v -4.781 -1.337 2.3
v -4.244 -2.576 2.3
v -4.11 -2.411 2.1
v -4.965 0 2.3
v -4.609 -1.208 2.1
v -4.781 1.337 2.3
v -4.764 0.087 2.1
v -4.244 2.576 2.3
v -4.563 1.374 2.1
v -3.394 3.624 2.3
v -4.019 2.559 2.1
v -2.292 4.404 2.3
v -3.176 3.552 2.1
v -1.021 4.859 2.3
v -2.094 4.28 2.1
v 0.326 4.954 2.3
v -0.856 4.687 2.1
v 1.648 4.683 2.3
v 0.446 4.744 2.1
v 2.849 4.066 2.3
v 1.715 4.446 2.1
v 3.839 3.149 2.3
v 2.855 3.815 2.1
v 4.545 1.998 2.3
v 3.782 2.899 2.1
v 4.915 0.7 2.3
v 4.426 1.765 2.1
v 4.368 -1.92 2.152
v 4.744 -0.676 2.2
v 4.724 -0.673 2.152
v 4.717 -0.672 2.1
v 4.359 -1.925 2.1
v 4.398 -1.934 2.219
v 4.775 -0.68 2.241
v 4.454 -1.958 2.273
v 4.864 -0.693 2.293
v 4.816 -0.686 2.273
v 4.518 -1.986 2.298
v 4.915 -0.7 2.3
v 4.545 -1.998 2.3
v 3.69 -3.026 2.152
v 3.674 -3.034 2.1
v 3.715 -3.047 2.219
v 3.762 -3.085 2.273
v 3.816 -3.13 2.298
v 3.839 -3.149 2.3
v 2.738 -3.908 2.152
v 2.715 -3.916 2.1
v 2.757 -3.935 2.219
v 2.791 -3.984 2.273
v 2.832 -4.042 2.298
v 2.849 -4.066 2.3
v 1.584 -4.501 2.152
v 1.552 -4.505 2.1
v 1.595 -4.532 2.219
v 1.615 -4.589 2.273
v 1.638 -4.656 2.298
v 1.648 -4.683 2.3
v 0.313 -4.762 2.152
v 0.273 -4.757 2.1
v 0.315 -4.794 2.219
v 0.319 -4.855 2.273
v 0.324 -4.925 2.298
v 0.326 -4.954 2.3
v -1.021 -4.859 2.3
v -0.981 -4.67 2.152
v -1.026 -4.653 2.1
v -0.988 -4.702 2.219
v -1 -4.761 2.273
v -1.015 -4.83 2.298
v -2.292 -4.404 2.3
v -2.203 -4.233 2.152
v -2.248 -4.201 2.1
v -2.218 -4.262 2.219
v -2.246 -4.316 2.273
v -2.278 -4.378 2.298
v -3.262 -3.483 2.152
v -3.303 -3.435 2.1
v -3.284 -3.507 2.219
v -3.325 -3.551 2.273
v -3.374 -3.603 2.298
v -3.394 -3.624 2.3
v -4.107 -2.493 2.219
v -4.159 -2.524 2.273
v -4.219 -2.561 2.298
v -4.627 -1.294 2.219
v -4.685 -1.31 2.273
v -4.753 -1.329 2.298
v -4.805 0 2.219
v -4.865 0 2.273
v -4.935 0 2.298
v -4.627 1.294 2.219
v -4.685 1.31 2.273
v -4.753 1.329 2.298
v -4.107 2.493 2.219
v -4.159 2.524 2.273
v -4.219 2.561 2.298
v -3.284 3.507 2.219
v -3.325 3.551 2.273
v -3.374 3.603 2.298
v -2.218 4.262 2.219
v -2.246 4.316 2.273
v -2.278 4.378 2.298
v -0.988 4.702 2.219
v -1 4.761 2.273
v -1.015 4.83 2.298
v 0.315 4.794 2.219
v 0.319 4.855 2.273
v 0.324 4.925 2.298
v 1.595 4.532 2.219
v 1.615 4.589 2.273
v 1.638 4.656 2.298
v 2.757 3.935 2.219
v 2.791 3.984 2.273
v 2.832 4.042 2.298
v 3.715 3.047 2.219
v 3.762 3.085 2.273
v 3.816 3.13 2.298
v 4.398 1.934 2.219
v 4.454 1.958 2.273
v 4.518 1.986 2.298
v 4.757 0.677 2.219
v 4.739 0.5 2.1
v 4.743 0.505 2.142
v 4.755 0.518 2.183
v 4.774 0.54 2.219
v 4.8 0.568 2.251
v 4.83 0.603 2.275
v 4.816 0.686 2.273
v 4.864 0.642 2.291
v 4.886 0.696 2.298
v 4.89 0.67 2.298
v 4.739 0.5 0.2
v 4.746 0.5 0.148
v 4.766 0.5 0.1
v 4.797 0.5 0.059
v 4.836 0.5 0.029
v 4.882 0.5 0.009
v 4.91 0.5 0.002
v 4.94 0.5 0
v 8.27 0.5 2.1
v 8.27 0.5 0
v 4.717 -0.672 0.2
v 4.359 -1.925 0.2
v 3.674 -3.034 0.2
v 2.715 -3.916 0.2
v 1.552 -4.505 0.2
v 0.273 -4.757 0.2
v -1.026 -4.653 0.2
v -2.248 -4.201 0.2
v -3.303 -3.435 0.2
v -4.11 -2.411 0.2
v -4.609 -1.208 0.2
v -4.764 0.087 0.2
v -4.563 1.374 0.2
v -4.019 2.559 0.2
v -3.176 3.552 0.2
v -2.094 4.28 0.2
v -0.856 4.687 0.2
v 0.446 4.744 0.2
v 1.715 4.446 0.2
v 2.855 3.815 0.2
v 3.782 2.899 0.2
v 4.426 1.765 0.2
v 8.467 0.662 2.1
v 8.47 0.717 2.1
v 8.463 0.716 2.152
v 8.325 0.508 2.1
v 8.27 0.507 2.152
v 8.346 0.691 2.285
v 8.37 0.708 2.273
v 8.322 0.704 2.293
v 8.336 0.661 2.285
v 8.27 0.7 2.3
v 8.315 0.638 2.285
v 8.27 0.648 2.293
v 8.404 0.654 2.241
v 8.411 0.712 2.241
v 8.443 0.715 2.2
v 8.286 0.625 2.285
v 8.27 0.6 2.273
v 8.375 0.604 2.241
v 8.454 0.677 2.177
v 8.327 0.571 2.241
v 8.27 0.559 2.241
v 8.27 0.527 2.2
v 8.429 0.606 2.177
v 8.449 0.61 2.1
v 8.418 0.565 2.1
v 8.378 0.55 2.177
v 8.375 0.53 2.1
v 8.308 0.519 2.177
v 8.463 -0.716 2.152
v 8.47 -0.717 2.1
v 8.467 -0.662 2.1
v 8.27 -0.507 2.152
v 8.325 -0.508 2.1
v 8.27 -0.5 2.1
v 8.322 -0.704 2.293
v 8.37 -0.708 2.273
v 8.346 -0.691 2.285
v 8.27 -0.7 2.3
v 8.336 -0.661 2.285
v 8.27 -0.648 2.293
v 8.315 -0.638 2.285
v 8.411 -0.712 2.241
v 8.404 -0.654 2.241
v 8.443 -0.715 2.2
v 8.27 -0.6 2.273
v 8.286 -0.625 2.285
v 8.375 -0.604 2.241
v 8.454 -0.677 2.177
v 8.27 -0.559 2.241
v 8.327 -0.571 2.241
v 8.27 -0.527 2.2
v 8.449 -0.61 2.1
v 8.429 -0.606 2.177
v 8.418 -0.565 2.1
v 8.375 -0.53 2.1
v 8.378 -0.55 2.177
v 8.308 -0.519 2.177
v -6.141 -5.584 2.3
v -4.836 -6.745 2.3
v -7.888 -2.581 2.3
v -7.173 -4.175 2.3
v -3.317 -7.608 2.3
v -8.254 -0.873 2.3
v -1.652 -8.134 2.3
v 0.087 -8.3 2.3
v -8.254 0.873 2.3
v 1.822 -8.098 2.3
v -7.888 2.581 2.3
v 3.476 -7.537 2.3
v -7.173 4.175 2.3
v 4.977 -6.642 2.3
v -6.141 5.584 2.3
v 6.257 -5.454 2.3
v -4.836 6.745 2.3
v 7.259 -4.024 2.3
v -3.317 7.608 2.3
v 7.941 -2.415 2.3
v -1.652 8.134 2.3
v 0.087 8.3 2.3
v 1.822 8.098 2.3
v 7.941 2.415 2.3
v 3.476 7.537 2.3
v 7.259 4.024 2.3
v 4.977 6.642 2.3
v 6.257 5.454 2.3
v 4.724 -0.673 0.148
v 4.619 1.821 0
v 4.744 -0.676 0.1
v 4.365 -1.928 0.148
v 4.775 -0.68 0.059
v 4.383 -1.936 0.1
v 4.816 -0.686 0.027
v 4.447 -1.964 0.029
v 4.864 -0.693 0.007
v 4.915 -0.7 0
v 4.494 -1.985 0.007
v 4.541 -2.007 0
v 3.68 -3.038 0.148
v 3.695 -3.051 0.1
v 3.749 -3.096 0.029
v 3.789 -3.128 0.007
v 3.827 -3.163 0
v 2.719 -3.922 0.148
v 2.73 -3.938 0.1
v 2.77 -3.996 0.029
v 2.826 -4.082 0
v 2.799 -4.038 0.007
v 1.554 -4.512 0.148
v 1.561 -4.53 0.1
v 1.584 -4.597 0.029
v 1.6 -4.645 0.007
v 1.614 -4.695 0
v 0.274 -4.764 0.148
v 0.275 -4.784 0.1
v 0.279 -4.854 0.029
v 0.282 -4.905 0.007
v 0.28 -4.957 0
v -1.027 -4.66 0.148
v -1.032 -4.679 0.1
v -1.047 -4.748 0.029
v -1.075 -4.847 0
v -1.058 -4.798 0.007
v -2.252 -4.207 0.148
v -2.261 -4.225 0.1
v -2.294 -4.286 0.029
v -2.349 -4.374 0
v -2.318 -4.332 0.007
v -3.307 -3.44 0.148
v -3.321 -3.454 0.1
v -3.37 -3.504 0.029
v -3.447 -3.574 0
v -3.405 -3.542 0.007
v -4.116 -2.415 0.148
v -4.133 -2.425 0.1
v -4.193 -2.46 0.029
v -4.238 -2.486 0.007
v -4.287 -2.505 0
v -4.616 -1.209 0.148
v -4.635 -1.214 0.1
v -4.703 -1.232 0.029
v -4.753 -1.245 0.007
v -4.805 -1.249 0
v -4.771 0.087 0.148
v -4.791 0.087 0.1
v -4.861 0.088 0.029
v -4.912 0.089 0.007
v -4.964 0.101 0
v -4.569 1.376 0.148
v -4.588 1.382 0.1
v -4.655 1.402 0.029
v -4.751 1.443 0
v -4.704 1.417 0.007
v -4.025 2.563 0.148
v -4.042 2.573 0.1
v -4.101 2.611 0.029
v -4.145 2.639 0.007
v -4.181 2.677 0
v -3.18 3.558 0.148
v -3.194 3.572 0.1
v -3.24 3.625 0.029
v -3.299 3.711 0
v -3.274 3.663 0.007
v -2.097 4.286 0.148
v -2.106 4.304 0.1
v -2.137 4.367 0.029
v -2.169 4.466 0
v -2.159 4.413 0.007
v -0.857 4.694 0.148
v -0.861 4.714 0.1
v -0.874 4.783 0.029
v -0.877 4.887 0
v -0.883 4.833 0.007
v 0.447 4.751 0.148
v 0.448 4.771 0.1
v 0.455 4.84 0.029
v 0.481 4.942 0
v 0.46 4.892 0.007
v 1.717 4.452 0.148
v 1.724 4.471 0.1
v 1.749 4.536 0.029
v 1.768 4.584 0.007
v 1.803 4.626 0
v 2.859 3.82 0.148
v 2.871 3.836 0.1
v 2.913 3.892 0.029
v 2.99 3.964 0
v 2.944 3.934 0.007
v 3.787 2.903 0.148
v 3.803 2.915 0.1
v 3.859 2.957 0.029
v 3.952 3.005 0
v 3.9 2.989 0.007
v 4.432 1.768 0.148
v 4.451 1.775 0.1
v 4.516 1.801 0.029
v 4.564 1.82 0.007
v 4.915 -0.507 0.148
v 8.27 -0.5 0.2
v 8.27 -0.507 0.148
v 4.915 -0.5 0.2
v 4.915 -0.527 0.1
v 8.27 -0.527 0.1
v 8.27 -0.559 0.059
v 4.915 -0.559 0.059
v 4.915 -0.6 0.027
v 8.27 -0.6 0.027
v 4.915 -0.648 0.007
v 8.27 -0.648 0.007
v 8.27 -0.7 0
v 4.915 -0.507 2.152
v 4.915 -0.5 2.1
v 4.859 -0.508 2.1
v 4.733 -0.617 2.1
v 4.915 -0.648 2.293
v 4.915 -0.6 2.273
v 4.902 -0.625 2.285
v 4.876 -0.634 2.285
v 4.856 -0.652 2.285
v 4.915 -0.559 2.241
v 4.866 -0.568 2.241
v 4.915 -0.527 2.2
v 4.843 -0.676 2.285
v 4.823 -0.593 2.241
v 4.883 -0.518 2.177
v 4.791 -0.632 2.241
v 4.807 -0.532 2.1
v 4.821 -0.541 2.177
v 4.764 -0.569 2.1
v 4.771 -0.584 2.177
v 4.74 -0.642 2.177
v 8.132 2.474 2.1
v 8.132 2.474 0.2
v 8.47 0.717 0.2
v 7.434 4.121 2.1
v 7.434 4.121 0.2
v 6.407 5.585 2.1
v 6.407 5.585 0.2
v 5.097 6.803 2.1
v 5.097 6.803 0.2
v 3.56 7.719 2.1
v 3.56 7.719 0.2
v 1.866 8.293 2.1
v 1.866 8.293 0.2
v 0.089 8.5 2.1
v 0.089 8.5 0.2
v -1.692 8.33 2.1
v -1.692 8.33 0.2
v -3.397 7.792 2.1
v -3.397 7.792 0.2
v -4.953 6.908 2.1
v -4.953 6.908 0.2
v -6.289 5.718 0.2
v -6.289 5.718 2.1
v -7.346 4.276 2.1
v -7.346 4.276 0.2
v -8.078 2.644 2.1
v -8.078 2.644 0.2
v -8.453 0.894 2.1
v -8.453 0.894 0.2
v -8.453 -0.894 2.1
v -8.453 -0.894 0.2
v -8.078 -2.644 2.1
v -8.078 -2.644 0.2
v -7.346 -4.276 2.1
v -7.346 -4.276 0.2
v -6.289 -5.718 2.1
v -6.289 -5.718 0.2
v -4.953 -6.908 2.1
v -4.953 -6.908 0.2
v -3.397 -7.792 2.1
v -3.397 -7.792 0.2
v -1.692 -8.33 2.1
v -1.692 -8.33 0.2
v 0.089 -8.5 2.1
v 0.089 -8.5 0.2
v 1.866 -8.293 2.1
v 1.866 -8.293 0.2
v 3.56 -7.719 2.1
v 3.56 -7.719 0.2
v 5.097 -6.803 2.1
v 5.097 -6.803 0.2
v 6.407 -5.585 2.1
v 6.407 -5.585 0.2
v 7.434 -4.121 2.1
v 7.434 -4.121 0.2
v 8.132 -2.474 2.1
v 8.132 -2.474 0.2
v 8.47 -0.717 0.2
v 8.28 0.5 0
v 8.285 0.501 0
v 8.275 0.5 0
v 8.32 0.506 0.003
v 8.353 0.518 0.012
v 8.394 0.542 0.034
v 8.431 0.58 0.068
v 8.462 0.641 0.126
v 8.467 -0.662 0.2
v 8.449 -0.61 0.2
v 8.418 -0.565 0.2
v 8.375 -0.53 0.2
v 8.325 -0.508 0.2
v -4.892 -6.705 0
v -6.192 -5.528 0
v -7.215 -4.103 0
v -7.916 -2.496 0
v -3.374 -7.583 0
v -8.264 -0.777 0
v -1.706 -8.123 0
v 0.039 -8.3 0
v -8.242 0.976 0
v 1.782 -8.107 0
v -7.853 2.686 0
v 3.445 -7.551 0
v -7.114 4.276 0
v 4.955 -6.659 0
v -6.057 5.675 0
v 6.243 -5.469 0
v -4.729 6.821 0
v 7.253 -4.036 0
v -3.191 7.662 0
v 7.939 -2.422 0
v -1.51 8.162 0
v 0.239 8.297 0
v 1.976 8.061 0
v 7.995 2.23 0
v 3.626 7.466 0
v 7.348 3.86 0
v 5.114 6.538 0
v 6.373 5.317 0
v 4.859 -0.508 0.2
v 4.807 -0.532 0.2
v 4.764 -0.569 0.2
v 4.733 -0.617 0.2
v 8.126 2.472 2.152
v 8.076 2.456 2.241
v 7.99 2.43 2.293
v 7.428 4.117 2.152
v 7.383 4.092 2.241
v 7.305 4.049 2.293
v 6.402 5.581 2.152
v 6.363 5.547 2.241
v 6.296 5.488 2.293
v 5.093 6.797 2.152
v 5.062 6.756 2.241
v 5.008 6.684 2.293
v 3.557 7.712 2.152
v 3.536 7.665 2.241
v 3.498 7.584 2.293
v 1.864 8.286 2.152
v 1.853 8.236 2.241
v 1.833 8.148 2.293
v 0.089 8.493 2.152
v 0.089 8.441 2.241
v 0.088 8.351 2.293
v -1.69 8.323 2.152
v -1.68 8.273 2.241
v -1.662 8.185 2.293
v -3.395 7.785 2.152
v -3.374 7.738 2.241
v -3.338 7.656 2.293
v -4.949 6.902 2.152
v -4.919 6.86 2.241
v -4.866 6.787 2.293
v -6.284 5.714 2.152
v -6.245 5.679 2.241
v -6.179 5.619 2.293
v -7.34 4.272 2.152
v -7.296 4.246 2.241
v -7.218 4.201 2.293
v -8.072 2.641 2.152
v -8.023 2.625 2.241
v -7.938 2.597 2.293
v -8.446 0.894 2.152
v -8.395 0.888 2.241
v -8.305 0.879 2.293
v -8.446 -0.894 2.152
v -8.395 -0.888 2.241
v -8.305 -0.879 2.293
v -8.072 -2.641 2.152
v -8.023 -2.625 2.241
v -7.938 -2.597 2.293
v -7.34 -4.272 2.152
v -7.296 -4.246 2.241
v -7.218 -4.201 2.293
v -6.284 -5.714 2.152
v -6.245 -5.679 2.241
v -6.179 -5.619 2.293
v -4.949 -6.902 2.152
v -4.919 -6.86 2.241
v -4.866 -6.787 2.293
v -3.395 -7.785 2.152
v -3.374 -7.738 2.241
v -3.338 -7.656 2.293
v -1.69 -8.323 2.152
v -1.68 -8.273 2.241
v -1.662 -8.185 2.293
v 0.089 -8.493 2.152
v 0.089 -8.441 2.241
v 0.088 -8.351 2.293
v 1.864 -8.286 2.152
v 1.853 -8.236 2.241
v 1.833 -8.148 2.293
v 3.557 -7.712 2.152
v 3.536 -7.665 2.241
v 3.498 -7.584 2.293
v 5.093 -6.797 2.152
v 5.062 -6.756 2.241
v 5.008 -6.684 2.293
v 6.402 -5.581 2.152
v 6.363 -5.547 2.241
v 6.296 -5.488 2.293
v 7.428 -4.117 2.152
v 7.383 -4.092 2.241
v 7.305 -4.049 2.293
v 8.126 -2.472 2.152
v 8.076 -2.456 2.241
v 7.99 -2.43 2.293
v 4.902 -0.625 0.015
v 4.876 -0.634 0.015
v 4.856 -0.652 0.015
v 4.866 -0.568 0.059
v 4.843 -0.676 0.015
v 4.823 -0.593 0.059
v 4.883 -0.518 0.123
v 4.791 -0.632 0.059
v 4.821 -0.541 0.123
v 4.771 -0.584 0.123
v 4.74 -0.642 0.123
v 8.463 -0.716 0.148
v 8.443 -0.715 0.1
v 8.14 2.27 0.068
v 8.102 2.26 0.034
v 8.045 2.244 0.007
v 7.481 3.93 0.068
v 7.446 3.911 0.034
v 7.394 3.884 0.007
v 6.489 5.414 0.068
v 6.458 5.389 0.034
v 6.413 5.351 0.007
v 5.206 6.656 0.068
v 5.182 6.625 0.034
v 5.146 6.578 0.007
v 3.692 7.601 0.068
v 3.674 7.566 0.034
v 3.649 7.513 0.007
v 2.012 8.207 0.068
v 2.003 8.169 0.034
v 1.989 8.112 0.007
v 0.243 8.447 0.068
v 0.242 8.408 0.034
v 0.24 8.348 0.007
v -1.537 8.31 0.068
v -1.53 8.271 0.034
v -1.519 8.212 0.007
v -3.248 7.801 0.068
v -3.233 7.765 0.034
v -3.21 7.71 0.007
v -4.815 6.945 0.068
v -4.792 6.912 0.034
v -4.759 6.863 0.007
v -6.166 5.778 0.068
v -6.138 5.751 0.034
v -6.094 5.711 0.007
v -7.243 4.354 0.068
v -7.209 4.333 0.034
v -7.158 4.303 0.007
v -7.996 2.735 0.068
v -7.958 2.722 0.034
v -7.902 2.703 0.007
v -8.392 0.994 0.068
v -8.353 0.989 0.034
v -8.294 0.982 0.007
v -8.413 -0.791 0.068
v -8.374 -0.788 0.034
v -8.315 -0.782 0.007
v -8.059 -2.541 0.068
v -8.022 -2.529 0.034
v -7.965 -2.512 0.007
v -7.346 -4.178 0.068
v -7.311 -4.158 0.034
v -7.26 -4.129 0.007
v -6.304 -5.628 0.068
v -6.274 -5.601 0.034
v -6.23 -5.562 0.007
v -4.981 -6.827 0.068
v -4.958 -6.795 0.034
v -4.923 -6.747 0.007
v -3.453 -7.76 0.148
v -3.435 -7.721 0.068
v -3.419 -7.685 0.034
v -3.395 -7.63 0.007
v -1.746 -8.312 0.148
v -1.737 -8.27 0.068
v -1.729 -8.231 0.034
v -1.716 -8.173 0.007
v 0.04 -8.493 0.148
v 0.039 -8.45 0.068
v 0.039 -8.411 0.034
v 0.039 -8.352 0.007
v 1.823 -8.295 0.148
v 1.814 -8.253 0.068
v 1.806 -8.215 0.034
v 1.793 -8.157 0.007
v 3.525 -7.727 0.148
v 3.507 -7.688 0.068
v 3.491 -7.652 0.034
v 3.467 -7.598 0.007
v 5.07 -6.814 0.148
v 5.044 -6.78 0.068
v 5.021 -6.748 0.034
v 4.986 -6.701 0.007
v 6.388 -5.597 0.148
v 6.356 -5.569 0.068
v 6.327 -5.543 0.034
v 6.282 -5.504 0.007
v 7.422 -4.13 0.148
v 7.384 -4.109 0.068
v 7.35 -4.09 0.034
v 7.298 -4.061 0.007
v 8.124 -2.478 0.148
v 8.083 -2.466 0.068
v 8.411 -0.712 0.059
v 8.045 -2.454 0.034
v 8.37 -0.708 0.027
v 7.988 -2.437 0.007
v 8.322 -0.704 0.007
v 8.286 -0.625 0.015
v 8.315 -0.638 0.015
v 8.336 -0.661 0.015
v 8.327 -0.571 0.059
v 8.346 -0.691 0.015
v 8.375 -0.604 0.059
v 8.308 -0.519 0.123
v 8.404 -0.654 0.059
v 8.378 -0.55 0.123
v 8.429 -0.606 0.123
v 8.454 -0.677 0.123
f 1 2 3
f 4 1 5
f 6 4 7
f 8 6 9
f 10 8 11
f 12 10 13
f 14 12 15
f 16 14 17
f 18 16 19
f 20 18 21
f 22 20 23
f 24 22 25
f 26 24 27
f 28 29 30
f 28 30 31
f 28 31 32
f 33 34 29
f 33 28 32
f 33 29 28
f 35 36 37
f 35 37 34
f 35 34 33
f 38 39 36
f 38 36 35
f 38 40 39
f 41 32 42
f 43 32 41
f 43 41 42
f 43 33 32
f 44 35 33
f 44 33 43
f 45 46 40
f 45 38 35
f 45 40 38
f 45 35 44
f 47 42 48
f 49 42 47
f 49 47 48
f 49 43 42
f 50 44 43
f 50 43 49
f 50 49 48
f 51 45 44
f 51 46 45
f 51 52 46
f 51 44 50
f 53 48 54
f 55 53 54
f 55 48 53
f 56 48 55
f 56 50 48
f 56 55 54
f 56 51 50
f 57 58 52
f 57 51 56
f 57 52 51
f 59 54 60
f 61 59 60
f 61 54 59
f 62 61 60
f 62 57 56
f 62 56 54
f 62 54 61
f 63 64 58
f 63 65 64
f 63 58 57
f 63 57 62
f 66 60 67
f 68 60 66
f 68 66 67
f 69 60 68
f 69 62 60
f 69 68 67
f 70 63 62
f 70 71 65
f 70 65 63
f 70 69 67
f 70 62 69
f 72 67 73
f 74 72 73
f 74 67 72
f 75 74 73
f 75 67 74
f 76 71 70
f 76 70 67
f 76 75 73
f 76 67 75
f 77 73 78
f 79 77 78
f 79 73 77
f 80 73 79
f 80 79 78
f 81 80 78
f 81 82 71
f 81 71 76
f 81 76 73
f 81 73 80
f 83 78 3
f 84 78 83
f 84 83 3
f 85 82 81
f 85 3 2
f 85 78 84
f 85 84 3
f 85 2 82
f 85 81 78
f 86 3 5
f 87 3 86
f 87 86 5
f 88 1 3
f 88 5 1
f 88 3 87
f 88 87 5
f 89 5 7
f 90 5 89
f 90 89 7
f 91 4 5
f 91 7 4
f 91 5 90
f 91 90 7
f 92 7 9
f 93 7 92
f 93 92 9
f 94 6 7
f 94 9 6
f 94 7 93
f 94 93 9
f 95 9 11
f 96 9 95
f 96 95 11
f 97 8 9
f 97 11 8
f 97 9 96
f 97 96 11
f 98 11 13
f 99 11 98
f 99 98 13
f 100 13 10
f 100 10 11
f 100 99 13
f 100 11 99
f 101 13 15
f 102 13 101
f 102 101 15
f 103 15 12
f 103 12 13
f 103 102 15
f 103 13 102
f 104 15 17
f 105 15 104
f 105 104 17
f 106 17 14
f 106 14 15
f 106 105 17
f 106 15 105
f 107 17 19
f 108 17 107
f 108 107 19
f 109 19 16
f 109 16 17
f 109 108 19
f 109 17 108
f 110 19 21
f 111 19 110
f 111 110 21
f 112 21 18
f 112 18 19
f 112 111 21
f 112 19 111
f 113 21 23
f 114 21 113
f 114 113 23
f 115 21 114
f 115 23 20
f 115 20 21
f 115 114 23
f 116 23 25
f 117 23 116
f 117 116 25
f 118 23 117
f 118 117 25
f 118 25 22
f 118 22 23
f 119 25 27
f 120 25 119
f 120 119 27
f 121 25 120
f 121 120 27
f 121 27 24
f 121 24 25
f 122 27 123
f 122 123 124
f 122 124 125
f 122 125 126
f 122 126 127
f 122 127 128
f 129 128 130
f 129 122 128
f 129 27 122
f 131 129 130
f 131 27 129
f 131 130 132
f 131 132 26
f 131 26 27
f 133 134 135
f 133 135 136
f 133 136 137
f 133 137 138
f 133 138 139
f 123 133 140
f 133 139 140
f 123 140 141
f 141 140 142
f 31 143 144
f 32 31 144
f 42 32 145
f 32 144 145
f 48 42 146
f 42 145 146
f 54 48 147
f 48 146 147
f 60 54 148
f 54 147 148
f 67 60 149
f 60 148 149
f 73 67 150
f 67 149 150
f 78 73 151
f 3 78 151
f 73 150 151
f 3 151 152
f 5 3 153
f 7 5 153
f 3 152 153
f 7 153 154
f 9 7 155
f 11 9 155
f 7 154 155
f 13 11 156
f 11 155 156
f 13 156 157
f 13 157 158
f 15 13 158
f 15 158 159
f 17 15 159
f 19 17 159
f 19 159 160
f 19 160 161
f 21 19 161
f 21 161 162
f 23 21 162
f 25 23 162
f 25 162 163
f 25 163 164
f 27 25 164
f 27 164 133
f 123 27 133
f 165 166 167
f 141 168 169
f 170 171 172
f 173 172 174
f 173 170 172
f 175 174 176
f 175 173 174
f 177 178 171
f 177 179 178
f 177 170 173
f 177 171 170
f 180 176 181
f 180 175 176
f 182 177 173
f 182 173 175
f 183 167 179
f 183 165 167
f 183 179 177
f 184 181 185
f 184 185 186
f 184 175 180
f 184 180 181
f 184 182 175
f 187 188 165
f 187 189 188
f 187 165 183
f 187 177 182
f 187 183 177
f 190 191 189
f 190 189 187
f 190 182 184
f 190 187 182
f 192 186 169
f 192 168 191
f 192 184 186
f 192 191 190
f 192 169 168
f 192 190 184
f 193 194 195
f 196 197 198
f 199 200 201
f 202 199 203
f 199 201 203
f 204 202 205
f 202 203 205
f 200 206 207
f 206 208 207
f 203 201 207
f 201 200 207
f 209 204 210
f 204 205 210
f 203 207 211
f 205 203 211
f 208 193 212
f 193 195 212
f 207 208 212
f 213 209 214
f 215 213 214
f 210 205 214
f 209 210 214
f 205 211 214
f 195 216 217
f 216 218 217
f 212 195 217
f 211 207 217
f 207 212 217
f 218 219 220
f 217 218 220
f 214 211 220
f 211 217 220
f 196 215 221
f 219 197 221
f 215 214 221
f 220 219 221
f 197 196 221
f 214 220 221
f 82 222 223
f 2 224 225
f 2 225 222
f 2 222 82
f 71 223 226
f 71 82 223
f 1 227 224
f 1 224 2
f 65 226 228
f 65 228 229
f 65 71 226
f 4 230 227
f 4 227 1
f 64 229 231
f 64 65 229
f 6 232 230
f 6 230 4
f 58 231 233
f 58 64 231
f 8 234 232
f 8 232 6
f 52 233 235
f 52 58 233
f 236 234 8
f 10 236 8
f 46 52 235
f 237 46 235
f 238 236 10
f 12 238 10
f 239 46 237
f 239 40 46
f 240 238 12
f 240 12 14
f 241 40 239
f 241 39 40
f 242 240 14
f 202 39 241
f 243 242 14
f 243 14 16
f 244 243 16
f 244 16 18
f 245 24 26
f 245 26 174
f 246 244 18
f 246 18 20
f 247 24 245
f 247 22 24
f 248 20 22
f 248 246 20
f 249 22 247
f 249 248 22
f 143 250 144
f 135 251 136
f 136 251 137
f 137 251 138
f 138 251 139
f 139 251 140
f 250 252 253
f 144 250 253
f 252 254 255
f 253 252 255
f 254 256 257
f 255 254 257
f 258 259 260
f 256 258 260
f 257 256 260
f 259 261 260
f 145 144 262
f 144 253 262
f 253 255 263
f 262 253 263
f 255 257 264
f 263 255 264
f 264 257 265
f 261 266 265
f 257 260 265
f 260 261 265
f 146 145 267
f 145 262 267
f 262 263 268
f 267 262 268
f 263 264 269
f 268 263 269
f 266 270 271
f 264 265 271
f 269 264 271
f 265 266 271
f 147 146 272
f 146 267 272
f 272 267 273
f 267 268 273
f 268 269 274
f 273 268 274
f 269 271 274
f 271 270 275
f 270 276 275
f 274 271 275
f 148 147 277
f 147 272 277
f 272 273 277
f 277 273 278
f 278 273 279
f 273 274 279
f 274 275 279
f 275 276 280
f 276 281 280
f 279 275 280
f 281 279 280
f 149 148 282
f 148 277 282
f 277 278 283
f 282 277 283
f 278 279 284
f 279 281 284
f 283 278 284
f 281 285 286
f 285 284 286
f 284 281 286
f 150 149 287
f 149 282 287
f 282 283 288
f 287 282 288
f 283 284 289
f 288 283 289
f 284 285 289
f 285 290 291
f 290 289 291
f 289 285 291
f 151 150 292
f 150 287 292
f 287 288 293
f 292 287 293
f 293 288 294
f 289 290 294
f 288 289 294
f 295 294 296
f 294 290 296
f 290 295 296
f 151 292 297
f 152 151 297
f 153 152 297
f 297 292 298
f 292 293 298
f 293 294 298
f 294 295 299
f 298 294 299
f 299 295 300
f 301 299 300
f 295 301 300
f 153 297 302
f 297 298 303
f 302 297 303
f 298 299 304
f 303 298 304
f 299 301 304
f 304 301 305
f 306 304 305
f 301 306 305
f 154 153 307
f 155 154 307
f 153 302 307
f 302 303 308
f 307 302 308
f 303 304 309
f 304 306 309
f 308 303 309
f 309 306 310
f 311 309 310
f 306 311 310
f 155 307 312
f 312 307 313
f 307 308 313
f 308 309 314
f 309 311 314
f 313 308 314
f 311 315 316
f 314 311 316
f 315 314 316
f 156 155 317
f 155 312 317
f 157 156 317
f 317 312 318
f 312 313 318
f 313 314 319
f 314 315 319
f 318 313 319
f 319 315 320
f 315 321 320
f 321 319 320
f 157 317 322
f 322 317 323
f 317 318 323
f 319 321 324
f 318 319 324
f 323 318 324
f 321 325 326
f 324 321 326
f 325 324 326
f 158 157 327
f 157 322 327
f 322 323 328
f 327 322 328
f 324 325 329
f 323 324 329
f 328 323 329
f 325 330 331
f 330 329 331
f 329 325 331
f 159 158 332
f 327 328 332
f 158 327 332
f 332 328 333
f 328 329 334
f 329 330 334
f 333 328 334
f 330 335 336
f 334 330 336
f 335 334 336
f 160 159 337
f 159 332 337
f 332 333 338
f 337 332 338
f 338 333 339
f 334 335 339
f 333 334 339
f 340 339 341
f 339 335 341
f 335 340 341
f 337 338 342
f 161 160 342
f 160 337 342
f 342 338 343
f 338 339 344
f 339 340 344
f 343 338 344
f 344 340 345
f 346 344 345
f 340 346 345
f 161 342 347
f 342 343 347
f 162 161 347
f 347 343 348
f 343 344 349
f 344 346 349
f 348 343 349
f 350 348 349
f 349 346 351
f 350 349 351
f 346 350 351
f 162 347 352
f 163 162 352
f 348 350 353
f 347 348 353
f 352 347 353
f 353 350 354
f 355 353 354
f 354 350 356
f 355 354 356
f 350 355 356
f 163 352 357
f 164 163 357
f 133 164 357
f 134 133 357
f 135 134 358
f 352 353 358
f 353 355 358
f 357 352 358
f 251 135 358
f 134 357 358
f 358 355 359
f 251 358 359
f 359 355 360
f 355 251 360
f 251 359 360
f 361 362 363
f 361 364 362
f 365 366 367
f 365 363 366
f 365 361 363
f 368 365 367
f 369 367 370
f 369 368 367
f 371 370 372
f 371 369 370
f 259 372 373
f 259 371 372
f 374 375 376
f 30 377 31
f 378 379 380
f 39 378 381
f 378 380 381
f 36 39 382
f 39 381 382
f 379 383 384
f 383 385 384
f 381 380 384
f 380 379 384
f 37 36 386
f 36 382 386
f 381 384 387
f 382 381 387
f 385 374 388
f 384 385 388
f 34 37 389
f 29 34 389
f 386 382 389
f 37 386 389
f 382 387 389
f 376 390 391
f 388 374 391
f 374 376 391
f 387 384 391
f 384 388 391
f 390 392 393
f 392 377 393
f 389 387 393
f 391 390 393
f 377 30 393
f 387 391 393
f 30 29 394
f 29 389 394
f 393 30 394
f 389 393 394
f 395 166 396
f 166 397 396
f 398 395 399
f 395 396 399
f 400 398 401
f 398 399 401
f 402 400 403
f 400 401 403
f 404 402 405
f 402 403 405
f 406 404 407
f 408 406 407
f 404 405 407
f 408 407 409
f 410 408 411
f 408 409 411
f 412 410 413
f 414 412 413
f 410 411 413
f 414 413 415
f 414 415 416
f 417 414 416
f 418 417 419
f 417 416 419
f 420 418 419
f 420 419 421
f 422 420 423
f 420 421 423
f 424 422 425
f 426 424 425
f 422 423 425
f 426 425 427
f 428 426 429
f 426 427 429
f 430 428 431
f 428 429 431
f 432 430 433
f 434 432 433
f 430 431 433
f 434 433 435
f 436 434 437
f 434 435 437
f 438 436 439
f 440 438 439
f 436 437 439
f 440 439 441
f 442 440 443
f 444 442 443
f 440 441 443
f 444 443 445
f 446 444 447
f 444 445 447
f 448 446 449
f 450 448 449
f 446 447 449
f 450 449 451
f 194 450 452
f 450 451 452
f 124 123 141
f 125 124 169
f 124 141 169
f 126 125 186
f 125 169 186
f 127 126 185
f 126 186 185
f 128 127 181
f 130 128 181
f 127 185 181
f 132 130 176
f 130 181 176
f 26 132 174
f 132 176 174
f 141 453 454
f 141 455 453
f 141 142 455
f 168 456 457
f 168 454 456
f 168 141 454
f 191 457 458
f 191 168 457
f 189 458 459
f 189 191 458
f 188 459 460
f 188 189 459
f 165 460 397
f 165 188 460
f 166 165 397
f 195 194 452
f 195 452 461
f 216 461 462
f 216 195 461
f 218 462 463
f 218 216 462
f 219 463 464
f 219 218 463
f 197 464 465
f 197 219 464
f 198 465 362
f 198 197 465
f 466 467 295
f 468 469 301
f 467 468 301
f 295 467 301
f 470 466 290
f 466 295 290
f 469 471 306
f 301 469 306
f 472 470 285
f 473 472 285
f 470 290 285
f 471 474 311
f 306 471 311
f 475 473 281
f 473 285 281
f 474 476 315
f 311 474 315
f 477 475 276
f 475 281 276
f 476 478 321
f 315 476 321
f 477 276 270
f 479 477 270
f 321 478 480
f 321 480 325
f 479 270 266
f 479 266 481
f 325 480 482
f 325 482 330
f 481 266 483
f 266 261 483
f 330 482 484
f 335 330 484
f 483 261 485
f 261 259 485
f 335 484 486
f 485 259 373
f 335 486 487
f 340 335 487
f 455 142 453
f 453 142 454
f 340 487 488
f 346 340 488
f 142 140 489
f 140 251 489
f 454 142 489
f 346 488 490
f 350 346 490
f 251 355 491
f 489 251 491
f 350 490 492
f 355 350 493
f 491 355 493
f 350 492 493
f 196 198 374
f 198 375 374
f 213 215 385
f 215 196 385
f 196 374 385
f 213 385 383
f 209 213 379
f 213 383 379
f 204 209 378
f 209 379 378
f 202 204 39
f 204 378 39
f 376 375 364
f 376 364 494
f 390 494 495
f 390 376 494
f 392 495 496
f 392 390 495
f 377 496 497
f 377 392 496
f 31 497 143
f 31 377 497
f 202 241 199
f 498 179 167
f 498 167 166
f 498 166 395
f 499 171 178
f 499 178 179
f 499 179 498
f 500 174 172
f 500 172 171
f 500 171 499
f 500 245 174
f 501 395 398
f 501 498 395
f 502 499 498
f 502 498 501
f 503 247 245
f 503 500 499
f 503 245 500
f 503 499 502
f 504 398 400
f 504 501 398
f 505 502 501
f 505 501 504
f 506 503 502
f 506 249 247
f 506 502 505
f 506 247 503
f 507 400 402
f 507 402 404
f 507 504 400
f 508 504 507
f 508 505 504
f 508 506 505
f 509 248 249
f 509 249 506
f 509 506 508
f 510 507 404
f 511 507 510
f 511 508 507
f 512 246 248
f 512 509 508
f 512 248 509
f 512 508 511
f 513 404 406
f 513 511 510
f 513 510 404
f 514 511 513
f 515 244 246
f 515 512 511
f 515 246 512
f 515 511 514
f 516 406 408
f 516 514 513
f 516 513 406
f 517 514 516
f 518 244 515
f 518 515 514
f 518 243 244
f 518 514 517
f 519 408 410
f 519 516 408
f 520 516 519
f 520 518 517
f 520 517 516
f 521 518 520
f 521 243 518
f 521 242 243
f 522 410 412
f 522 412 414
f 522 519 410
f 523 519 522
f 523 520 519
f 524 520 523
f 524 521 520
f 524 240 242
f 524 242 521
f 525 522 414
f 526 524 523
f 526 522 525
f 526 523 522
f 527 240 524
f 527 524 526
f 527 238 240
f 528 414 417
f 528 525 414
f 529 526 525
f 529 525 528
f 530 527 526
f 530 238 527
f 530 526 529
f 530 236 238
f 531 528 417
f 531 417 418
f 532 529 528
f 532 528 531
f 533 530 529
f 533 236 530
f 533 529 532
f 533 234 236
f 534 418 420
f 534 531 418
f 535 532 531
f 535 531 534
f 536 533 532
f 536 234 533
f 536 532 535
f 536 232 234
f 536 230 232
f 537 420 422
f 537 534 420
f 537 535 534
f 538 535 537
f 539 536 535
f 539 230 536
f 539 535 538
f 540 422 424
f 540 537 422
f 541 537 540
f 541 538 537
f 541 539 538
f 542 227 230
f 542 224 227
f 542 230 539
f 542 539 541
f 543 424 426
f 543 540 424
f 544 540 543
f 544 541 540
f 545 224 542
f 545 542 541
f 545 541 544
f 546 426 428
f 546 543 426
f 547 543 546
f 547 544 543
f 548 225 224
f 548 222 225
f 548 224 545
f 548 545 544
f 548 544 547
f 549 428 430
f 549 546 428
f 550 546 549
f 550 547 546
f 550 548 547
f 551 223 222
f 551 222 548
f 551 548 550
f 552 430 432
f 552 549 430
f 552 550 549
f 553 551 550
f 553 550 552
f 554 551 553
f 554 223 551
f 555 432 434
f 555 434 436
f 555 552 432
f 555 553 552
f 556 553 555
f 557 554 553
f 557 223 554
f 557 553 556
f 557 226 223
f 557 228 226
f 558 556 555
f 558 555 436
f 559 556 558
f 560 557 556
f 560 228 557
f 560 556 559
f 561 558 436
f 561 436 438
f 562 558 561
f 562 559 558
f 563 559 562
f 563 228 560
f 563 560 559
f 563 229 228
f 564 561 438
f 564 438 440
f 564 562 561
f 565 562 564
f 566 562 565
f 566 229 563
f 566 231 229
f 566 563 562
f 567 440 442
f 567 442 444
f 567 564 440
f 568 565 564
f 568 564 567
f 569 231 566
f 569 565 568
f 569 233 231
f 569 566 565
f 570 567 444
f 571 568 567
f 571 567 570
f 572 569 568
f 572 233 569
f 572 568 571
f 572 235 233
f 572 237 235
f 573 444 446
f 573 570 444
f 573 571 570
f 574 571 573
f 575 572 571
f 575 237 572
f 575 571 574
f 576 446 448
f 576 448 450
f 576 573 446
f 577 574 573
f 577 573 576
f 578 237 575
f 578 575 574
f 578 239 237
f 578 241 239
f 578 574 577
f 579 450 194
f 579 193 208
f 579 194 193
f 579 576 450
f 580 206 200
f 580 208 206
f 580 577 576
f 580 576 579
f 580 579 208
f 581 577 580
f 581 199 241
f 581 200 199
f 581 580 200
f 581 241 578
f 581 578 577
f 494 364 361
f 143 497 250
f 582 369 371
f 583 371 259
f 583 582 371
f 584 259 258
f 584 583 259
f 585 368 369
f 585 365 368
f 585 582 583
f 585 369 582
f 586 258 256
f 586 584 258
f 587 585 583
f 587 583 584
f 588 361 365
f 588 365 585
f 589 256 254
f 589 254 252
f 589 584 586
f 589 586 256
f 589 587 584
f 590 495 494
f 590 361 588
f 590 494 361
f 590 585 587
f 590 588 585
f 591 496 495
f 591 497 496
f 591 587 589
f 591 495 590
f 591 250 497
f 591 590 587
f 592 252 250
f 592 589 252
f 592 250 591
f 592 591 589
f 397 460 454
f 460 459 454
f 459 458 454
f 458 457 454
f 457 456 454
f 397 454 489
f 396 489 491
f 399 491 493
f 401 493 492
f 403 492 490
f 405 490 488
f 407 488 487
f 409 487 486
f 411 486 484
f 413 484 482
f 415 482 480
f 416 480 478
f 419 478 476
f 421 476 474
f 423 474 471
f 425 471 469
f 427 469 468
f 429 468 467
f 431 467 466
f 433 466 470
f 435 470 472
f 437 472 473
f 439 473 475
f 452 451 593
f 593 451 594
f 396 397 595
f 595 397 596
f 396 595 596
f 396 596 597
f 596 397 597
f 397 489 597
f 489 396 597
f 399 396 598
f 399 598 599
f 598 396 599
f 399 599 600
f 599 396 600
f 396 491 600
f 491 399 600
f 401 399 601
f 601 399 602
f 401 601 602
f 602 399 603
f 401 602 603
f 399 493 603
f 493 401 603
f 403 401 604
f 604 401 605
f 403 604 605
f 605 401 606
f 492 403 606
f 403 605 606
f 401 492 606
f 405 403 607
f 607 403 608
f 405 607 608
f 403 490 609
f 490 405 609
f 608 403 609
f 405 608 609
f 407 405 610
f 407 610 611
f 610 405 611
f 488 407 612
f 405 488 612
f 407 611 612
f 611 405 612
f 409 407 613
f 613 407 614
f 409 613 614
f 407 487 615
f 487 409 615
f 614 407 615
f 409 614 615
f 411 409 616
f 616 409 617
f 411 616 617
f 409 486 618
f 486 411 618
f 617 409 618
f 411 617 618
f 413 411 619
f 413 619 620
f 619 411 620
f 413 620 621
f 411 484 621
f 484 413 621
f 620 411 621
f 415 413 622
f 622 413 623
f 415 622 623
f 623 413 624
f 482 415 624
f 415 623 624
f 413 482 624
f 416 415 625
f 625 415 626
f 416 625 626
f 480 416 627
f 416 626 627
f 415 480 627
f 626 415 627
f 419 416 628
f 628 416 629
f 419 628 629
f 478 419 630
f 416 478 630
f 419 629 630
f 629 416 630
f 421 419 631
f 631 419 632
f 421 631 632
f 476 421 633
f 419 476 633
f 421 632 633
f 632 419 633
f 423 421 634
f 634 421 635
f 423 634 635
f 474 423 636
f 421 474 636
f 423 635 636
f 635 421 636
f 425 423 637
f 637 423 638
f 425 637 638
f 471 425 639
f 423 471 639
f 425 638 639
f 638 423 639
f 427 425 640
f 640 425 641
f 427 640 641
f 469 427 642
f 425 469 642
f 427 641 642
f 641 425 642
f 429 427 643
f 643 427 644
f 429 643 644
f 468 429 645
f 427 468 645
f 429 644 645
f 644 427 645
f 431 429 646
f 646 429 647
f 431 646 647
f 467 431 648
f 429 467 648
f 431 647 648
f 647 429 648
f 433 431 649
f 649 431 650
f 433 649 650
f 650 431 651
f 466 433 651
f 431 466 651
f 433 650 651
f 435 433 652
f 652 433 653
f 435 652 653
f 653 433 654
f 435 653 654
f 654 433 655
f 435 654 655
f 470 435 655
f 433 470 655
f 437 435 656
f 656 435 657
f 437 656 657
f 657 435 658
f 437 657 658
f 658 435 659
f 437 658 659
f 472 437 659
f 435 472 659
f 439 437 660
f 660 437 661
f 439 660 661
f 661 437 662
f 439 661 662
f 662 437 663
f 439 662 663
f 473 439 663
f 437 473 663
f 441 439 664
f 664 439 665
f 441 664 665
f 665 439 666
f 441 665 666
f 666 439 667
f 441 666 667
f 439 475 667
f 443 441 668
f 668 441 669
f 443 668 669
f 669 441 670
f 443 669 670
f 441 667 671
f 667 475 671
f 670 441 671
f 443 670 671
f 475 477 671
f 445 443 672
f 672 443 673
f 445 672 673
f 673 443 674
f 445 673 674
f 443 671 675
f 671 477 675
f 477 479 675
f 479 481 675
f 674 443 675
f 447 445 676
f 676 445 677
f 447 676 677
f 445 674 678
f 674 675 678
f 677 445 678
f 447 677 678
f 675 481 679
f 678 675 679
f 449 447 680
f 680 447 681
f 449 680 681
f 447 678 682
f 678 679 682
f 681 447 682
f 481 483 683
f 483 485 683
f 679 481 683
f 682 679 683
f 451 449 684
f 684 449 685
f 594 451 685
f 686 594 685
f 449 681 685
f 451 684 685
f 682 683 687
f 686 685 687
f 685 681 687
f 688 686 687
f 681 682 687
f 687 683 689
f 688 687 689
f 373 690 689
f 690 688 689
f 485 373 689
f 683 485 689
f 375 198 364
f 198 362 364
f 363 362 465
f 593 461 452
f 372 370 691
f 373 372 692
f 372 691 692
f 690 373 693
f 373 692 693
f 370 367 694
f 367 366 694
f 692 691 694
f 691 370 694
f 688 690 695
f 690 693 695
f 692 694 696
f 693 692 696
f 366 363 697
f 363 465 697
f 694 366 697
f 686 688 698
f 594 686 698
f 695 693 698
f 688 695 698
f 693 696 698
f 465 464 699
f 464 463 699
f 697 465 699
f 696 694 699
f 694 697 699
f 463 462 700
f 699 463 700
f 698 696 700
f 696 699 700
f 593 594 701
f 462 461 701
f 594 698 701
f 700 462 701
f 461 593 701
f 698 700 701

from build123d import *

# Parameters (mm, degrees)
RESSALTO_EXTRUS_O1_DEPTH = 2.3
FILETE1_R                = 0.2


with BuildPart() as part:
    # Esboço1 → Ressalto-extrusão1 (new body)
    with BuildSketch(Plane.XY):
        with BuildLine():
            Line((4.73869444, 0.5), (8.485281374, 0.5))
            ThreePointArc((8.485281374, 0.5), (-8.5, 0), (8.485281374, -0.5))
            Line((8.485281374, -0.5), (4.73869444, -0.5))
            ThreePointArc((4.73869444, -0.5), (-4.765, 0), (4.73869444, 0.5))
        make_face()
    extrude(amount=RESSALTO_EXTRUS_O1_DEPTH)

    # Filete1
    filete1_edges = [part.edges().sort_by_distance(p)[0] for p in [
        (-8.5, 0, 2.3),
        (6.611987907, -0.5, 2.3),
        (-4.765, 0, 2.3),
        (6.611987907, -0.5, 0),
        (-8.5, 0, 0),
        (-4.765, 0, 0),
        (6.611987907, 0.5, 2.3),
        (4.73869444, -0.5, 1.15),
        (8.485281374, -0.5, 1.15),
        (8.485281374, 0.5, 1.15),
    ]]
    fillet(filete1_edges, radius=FILETE1_R)


solid = part.part
